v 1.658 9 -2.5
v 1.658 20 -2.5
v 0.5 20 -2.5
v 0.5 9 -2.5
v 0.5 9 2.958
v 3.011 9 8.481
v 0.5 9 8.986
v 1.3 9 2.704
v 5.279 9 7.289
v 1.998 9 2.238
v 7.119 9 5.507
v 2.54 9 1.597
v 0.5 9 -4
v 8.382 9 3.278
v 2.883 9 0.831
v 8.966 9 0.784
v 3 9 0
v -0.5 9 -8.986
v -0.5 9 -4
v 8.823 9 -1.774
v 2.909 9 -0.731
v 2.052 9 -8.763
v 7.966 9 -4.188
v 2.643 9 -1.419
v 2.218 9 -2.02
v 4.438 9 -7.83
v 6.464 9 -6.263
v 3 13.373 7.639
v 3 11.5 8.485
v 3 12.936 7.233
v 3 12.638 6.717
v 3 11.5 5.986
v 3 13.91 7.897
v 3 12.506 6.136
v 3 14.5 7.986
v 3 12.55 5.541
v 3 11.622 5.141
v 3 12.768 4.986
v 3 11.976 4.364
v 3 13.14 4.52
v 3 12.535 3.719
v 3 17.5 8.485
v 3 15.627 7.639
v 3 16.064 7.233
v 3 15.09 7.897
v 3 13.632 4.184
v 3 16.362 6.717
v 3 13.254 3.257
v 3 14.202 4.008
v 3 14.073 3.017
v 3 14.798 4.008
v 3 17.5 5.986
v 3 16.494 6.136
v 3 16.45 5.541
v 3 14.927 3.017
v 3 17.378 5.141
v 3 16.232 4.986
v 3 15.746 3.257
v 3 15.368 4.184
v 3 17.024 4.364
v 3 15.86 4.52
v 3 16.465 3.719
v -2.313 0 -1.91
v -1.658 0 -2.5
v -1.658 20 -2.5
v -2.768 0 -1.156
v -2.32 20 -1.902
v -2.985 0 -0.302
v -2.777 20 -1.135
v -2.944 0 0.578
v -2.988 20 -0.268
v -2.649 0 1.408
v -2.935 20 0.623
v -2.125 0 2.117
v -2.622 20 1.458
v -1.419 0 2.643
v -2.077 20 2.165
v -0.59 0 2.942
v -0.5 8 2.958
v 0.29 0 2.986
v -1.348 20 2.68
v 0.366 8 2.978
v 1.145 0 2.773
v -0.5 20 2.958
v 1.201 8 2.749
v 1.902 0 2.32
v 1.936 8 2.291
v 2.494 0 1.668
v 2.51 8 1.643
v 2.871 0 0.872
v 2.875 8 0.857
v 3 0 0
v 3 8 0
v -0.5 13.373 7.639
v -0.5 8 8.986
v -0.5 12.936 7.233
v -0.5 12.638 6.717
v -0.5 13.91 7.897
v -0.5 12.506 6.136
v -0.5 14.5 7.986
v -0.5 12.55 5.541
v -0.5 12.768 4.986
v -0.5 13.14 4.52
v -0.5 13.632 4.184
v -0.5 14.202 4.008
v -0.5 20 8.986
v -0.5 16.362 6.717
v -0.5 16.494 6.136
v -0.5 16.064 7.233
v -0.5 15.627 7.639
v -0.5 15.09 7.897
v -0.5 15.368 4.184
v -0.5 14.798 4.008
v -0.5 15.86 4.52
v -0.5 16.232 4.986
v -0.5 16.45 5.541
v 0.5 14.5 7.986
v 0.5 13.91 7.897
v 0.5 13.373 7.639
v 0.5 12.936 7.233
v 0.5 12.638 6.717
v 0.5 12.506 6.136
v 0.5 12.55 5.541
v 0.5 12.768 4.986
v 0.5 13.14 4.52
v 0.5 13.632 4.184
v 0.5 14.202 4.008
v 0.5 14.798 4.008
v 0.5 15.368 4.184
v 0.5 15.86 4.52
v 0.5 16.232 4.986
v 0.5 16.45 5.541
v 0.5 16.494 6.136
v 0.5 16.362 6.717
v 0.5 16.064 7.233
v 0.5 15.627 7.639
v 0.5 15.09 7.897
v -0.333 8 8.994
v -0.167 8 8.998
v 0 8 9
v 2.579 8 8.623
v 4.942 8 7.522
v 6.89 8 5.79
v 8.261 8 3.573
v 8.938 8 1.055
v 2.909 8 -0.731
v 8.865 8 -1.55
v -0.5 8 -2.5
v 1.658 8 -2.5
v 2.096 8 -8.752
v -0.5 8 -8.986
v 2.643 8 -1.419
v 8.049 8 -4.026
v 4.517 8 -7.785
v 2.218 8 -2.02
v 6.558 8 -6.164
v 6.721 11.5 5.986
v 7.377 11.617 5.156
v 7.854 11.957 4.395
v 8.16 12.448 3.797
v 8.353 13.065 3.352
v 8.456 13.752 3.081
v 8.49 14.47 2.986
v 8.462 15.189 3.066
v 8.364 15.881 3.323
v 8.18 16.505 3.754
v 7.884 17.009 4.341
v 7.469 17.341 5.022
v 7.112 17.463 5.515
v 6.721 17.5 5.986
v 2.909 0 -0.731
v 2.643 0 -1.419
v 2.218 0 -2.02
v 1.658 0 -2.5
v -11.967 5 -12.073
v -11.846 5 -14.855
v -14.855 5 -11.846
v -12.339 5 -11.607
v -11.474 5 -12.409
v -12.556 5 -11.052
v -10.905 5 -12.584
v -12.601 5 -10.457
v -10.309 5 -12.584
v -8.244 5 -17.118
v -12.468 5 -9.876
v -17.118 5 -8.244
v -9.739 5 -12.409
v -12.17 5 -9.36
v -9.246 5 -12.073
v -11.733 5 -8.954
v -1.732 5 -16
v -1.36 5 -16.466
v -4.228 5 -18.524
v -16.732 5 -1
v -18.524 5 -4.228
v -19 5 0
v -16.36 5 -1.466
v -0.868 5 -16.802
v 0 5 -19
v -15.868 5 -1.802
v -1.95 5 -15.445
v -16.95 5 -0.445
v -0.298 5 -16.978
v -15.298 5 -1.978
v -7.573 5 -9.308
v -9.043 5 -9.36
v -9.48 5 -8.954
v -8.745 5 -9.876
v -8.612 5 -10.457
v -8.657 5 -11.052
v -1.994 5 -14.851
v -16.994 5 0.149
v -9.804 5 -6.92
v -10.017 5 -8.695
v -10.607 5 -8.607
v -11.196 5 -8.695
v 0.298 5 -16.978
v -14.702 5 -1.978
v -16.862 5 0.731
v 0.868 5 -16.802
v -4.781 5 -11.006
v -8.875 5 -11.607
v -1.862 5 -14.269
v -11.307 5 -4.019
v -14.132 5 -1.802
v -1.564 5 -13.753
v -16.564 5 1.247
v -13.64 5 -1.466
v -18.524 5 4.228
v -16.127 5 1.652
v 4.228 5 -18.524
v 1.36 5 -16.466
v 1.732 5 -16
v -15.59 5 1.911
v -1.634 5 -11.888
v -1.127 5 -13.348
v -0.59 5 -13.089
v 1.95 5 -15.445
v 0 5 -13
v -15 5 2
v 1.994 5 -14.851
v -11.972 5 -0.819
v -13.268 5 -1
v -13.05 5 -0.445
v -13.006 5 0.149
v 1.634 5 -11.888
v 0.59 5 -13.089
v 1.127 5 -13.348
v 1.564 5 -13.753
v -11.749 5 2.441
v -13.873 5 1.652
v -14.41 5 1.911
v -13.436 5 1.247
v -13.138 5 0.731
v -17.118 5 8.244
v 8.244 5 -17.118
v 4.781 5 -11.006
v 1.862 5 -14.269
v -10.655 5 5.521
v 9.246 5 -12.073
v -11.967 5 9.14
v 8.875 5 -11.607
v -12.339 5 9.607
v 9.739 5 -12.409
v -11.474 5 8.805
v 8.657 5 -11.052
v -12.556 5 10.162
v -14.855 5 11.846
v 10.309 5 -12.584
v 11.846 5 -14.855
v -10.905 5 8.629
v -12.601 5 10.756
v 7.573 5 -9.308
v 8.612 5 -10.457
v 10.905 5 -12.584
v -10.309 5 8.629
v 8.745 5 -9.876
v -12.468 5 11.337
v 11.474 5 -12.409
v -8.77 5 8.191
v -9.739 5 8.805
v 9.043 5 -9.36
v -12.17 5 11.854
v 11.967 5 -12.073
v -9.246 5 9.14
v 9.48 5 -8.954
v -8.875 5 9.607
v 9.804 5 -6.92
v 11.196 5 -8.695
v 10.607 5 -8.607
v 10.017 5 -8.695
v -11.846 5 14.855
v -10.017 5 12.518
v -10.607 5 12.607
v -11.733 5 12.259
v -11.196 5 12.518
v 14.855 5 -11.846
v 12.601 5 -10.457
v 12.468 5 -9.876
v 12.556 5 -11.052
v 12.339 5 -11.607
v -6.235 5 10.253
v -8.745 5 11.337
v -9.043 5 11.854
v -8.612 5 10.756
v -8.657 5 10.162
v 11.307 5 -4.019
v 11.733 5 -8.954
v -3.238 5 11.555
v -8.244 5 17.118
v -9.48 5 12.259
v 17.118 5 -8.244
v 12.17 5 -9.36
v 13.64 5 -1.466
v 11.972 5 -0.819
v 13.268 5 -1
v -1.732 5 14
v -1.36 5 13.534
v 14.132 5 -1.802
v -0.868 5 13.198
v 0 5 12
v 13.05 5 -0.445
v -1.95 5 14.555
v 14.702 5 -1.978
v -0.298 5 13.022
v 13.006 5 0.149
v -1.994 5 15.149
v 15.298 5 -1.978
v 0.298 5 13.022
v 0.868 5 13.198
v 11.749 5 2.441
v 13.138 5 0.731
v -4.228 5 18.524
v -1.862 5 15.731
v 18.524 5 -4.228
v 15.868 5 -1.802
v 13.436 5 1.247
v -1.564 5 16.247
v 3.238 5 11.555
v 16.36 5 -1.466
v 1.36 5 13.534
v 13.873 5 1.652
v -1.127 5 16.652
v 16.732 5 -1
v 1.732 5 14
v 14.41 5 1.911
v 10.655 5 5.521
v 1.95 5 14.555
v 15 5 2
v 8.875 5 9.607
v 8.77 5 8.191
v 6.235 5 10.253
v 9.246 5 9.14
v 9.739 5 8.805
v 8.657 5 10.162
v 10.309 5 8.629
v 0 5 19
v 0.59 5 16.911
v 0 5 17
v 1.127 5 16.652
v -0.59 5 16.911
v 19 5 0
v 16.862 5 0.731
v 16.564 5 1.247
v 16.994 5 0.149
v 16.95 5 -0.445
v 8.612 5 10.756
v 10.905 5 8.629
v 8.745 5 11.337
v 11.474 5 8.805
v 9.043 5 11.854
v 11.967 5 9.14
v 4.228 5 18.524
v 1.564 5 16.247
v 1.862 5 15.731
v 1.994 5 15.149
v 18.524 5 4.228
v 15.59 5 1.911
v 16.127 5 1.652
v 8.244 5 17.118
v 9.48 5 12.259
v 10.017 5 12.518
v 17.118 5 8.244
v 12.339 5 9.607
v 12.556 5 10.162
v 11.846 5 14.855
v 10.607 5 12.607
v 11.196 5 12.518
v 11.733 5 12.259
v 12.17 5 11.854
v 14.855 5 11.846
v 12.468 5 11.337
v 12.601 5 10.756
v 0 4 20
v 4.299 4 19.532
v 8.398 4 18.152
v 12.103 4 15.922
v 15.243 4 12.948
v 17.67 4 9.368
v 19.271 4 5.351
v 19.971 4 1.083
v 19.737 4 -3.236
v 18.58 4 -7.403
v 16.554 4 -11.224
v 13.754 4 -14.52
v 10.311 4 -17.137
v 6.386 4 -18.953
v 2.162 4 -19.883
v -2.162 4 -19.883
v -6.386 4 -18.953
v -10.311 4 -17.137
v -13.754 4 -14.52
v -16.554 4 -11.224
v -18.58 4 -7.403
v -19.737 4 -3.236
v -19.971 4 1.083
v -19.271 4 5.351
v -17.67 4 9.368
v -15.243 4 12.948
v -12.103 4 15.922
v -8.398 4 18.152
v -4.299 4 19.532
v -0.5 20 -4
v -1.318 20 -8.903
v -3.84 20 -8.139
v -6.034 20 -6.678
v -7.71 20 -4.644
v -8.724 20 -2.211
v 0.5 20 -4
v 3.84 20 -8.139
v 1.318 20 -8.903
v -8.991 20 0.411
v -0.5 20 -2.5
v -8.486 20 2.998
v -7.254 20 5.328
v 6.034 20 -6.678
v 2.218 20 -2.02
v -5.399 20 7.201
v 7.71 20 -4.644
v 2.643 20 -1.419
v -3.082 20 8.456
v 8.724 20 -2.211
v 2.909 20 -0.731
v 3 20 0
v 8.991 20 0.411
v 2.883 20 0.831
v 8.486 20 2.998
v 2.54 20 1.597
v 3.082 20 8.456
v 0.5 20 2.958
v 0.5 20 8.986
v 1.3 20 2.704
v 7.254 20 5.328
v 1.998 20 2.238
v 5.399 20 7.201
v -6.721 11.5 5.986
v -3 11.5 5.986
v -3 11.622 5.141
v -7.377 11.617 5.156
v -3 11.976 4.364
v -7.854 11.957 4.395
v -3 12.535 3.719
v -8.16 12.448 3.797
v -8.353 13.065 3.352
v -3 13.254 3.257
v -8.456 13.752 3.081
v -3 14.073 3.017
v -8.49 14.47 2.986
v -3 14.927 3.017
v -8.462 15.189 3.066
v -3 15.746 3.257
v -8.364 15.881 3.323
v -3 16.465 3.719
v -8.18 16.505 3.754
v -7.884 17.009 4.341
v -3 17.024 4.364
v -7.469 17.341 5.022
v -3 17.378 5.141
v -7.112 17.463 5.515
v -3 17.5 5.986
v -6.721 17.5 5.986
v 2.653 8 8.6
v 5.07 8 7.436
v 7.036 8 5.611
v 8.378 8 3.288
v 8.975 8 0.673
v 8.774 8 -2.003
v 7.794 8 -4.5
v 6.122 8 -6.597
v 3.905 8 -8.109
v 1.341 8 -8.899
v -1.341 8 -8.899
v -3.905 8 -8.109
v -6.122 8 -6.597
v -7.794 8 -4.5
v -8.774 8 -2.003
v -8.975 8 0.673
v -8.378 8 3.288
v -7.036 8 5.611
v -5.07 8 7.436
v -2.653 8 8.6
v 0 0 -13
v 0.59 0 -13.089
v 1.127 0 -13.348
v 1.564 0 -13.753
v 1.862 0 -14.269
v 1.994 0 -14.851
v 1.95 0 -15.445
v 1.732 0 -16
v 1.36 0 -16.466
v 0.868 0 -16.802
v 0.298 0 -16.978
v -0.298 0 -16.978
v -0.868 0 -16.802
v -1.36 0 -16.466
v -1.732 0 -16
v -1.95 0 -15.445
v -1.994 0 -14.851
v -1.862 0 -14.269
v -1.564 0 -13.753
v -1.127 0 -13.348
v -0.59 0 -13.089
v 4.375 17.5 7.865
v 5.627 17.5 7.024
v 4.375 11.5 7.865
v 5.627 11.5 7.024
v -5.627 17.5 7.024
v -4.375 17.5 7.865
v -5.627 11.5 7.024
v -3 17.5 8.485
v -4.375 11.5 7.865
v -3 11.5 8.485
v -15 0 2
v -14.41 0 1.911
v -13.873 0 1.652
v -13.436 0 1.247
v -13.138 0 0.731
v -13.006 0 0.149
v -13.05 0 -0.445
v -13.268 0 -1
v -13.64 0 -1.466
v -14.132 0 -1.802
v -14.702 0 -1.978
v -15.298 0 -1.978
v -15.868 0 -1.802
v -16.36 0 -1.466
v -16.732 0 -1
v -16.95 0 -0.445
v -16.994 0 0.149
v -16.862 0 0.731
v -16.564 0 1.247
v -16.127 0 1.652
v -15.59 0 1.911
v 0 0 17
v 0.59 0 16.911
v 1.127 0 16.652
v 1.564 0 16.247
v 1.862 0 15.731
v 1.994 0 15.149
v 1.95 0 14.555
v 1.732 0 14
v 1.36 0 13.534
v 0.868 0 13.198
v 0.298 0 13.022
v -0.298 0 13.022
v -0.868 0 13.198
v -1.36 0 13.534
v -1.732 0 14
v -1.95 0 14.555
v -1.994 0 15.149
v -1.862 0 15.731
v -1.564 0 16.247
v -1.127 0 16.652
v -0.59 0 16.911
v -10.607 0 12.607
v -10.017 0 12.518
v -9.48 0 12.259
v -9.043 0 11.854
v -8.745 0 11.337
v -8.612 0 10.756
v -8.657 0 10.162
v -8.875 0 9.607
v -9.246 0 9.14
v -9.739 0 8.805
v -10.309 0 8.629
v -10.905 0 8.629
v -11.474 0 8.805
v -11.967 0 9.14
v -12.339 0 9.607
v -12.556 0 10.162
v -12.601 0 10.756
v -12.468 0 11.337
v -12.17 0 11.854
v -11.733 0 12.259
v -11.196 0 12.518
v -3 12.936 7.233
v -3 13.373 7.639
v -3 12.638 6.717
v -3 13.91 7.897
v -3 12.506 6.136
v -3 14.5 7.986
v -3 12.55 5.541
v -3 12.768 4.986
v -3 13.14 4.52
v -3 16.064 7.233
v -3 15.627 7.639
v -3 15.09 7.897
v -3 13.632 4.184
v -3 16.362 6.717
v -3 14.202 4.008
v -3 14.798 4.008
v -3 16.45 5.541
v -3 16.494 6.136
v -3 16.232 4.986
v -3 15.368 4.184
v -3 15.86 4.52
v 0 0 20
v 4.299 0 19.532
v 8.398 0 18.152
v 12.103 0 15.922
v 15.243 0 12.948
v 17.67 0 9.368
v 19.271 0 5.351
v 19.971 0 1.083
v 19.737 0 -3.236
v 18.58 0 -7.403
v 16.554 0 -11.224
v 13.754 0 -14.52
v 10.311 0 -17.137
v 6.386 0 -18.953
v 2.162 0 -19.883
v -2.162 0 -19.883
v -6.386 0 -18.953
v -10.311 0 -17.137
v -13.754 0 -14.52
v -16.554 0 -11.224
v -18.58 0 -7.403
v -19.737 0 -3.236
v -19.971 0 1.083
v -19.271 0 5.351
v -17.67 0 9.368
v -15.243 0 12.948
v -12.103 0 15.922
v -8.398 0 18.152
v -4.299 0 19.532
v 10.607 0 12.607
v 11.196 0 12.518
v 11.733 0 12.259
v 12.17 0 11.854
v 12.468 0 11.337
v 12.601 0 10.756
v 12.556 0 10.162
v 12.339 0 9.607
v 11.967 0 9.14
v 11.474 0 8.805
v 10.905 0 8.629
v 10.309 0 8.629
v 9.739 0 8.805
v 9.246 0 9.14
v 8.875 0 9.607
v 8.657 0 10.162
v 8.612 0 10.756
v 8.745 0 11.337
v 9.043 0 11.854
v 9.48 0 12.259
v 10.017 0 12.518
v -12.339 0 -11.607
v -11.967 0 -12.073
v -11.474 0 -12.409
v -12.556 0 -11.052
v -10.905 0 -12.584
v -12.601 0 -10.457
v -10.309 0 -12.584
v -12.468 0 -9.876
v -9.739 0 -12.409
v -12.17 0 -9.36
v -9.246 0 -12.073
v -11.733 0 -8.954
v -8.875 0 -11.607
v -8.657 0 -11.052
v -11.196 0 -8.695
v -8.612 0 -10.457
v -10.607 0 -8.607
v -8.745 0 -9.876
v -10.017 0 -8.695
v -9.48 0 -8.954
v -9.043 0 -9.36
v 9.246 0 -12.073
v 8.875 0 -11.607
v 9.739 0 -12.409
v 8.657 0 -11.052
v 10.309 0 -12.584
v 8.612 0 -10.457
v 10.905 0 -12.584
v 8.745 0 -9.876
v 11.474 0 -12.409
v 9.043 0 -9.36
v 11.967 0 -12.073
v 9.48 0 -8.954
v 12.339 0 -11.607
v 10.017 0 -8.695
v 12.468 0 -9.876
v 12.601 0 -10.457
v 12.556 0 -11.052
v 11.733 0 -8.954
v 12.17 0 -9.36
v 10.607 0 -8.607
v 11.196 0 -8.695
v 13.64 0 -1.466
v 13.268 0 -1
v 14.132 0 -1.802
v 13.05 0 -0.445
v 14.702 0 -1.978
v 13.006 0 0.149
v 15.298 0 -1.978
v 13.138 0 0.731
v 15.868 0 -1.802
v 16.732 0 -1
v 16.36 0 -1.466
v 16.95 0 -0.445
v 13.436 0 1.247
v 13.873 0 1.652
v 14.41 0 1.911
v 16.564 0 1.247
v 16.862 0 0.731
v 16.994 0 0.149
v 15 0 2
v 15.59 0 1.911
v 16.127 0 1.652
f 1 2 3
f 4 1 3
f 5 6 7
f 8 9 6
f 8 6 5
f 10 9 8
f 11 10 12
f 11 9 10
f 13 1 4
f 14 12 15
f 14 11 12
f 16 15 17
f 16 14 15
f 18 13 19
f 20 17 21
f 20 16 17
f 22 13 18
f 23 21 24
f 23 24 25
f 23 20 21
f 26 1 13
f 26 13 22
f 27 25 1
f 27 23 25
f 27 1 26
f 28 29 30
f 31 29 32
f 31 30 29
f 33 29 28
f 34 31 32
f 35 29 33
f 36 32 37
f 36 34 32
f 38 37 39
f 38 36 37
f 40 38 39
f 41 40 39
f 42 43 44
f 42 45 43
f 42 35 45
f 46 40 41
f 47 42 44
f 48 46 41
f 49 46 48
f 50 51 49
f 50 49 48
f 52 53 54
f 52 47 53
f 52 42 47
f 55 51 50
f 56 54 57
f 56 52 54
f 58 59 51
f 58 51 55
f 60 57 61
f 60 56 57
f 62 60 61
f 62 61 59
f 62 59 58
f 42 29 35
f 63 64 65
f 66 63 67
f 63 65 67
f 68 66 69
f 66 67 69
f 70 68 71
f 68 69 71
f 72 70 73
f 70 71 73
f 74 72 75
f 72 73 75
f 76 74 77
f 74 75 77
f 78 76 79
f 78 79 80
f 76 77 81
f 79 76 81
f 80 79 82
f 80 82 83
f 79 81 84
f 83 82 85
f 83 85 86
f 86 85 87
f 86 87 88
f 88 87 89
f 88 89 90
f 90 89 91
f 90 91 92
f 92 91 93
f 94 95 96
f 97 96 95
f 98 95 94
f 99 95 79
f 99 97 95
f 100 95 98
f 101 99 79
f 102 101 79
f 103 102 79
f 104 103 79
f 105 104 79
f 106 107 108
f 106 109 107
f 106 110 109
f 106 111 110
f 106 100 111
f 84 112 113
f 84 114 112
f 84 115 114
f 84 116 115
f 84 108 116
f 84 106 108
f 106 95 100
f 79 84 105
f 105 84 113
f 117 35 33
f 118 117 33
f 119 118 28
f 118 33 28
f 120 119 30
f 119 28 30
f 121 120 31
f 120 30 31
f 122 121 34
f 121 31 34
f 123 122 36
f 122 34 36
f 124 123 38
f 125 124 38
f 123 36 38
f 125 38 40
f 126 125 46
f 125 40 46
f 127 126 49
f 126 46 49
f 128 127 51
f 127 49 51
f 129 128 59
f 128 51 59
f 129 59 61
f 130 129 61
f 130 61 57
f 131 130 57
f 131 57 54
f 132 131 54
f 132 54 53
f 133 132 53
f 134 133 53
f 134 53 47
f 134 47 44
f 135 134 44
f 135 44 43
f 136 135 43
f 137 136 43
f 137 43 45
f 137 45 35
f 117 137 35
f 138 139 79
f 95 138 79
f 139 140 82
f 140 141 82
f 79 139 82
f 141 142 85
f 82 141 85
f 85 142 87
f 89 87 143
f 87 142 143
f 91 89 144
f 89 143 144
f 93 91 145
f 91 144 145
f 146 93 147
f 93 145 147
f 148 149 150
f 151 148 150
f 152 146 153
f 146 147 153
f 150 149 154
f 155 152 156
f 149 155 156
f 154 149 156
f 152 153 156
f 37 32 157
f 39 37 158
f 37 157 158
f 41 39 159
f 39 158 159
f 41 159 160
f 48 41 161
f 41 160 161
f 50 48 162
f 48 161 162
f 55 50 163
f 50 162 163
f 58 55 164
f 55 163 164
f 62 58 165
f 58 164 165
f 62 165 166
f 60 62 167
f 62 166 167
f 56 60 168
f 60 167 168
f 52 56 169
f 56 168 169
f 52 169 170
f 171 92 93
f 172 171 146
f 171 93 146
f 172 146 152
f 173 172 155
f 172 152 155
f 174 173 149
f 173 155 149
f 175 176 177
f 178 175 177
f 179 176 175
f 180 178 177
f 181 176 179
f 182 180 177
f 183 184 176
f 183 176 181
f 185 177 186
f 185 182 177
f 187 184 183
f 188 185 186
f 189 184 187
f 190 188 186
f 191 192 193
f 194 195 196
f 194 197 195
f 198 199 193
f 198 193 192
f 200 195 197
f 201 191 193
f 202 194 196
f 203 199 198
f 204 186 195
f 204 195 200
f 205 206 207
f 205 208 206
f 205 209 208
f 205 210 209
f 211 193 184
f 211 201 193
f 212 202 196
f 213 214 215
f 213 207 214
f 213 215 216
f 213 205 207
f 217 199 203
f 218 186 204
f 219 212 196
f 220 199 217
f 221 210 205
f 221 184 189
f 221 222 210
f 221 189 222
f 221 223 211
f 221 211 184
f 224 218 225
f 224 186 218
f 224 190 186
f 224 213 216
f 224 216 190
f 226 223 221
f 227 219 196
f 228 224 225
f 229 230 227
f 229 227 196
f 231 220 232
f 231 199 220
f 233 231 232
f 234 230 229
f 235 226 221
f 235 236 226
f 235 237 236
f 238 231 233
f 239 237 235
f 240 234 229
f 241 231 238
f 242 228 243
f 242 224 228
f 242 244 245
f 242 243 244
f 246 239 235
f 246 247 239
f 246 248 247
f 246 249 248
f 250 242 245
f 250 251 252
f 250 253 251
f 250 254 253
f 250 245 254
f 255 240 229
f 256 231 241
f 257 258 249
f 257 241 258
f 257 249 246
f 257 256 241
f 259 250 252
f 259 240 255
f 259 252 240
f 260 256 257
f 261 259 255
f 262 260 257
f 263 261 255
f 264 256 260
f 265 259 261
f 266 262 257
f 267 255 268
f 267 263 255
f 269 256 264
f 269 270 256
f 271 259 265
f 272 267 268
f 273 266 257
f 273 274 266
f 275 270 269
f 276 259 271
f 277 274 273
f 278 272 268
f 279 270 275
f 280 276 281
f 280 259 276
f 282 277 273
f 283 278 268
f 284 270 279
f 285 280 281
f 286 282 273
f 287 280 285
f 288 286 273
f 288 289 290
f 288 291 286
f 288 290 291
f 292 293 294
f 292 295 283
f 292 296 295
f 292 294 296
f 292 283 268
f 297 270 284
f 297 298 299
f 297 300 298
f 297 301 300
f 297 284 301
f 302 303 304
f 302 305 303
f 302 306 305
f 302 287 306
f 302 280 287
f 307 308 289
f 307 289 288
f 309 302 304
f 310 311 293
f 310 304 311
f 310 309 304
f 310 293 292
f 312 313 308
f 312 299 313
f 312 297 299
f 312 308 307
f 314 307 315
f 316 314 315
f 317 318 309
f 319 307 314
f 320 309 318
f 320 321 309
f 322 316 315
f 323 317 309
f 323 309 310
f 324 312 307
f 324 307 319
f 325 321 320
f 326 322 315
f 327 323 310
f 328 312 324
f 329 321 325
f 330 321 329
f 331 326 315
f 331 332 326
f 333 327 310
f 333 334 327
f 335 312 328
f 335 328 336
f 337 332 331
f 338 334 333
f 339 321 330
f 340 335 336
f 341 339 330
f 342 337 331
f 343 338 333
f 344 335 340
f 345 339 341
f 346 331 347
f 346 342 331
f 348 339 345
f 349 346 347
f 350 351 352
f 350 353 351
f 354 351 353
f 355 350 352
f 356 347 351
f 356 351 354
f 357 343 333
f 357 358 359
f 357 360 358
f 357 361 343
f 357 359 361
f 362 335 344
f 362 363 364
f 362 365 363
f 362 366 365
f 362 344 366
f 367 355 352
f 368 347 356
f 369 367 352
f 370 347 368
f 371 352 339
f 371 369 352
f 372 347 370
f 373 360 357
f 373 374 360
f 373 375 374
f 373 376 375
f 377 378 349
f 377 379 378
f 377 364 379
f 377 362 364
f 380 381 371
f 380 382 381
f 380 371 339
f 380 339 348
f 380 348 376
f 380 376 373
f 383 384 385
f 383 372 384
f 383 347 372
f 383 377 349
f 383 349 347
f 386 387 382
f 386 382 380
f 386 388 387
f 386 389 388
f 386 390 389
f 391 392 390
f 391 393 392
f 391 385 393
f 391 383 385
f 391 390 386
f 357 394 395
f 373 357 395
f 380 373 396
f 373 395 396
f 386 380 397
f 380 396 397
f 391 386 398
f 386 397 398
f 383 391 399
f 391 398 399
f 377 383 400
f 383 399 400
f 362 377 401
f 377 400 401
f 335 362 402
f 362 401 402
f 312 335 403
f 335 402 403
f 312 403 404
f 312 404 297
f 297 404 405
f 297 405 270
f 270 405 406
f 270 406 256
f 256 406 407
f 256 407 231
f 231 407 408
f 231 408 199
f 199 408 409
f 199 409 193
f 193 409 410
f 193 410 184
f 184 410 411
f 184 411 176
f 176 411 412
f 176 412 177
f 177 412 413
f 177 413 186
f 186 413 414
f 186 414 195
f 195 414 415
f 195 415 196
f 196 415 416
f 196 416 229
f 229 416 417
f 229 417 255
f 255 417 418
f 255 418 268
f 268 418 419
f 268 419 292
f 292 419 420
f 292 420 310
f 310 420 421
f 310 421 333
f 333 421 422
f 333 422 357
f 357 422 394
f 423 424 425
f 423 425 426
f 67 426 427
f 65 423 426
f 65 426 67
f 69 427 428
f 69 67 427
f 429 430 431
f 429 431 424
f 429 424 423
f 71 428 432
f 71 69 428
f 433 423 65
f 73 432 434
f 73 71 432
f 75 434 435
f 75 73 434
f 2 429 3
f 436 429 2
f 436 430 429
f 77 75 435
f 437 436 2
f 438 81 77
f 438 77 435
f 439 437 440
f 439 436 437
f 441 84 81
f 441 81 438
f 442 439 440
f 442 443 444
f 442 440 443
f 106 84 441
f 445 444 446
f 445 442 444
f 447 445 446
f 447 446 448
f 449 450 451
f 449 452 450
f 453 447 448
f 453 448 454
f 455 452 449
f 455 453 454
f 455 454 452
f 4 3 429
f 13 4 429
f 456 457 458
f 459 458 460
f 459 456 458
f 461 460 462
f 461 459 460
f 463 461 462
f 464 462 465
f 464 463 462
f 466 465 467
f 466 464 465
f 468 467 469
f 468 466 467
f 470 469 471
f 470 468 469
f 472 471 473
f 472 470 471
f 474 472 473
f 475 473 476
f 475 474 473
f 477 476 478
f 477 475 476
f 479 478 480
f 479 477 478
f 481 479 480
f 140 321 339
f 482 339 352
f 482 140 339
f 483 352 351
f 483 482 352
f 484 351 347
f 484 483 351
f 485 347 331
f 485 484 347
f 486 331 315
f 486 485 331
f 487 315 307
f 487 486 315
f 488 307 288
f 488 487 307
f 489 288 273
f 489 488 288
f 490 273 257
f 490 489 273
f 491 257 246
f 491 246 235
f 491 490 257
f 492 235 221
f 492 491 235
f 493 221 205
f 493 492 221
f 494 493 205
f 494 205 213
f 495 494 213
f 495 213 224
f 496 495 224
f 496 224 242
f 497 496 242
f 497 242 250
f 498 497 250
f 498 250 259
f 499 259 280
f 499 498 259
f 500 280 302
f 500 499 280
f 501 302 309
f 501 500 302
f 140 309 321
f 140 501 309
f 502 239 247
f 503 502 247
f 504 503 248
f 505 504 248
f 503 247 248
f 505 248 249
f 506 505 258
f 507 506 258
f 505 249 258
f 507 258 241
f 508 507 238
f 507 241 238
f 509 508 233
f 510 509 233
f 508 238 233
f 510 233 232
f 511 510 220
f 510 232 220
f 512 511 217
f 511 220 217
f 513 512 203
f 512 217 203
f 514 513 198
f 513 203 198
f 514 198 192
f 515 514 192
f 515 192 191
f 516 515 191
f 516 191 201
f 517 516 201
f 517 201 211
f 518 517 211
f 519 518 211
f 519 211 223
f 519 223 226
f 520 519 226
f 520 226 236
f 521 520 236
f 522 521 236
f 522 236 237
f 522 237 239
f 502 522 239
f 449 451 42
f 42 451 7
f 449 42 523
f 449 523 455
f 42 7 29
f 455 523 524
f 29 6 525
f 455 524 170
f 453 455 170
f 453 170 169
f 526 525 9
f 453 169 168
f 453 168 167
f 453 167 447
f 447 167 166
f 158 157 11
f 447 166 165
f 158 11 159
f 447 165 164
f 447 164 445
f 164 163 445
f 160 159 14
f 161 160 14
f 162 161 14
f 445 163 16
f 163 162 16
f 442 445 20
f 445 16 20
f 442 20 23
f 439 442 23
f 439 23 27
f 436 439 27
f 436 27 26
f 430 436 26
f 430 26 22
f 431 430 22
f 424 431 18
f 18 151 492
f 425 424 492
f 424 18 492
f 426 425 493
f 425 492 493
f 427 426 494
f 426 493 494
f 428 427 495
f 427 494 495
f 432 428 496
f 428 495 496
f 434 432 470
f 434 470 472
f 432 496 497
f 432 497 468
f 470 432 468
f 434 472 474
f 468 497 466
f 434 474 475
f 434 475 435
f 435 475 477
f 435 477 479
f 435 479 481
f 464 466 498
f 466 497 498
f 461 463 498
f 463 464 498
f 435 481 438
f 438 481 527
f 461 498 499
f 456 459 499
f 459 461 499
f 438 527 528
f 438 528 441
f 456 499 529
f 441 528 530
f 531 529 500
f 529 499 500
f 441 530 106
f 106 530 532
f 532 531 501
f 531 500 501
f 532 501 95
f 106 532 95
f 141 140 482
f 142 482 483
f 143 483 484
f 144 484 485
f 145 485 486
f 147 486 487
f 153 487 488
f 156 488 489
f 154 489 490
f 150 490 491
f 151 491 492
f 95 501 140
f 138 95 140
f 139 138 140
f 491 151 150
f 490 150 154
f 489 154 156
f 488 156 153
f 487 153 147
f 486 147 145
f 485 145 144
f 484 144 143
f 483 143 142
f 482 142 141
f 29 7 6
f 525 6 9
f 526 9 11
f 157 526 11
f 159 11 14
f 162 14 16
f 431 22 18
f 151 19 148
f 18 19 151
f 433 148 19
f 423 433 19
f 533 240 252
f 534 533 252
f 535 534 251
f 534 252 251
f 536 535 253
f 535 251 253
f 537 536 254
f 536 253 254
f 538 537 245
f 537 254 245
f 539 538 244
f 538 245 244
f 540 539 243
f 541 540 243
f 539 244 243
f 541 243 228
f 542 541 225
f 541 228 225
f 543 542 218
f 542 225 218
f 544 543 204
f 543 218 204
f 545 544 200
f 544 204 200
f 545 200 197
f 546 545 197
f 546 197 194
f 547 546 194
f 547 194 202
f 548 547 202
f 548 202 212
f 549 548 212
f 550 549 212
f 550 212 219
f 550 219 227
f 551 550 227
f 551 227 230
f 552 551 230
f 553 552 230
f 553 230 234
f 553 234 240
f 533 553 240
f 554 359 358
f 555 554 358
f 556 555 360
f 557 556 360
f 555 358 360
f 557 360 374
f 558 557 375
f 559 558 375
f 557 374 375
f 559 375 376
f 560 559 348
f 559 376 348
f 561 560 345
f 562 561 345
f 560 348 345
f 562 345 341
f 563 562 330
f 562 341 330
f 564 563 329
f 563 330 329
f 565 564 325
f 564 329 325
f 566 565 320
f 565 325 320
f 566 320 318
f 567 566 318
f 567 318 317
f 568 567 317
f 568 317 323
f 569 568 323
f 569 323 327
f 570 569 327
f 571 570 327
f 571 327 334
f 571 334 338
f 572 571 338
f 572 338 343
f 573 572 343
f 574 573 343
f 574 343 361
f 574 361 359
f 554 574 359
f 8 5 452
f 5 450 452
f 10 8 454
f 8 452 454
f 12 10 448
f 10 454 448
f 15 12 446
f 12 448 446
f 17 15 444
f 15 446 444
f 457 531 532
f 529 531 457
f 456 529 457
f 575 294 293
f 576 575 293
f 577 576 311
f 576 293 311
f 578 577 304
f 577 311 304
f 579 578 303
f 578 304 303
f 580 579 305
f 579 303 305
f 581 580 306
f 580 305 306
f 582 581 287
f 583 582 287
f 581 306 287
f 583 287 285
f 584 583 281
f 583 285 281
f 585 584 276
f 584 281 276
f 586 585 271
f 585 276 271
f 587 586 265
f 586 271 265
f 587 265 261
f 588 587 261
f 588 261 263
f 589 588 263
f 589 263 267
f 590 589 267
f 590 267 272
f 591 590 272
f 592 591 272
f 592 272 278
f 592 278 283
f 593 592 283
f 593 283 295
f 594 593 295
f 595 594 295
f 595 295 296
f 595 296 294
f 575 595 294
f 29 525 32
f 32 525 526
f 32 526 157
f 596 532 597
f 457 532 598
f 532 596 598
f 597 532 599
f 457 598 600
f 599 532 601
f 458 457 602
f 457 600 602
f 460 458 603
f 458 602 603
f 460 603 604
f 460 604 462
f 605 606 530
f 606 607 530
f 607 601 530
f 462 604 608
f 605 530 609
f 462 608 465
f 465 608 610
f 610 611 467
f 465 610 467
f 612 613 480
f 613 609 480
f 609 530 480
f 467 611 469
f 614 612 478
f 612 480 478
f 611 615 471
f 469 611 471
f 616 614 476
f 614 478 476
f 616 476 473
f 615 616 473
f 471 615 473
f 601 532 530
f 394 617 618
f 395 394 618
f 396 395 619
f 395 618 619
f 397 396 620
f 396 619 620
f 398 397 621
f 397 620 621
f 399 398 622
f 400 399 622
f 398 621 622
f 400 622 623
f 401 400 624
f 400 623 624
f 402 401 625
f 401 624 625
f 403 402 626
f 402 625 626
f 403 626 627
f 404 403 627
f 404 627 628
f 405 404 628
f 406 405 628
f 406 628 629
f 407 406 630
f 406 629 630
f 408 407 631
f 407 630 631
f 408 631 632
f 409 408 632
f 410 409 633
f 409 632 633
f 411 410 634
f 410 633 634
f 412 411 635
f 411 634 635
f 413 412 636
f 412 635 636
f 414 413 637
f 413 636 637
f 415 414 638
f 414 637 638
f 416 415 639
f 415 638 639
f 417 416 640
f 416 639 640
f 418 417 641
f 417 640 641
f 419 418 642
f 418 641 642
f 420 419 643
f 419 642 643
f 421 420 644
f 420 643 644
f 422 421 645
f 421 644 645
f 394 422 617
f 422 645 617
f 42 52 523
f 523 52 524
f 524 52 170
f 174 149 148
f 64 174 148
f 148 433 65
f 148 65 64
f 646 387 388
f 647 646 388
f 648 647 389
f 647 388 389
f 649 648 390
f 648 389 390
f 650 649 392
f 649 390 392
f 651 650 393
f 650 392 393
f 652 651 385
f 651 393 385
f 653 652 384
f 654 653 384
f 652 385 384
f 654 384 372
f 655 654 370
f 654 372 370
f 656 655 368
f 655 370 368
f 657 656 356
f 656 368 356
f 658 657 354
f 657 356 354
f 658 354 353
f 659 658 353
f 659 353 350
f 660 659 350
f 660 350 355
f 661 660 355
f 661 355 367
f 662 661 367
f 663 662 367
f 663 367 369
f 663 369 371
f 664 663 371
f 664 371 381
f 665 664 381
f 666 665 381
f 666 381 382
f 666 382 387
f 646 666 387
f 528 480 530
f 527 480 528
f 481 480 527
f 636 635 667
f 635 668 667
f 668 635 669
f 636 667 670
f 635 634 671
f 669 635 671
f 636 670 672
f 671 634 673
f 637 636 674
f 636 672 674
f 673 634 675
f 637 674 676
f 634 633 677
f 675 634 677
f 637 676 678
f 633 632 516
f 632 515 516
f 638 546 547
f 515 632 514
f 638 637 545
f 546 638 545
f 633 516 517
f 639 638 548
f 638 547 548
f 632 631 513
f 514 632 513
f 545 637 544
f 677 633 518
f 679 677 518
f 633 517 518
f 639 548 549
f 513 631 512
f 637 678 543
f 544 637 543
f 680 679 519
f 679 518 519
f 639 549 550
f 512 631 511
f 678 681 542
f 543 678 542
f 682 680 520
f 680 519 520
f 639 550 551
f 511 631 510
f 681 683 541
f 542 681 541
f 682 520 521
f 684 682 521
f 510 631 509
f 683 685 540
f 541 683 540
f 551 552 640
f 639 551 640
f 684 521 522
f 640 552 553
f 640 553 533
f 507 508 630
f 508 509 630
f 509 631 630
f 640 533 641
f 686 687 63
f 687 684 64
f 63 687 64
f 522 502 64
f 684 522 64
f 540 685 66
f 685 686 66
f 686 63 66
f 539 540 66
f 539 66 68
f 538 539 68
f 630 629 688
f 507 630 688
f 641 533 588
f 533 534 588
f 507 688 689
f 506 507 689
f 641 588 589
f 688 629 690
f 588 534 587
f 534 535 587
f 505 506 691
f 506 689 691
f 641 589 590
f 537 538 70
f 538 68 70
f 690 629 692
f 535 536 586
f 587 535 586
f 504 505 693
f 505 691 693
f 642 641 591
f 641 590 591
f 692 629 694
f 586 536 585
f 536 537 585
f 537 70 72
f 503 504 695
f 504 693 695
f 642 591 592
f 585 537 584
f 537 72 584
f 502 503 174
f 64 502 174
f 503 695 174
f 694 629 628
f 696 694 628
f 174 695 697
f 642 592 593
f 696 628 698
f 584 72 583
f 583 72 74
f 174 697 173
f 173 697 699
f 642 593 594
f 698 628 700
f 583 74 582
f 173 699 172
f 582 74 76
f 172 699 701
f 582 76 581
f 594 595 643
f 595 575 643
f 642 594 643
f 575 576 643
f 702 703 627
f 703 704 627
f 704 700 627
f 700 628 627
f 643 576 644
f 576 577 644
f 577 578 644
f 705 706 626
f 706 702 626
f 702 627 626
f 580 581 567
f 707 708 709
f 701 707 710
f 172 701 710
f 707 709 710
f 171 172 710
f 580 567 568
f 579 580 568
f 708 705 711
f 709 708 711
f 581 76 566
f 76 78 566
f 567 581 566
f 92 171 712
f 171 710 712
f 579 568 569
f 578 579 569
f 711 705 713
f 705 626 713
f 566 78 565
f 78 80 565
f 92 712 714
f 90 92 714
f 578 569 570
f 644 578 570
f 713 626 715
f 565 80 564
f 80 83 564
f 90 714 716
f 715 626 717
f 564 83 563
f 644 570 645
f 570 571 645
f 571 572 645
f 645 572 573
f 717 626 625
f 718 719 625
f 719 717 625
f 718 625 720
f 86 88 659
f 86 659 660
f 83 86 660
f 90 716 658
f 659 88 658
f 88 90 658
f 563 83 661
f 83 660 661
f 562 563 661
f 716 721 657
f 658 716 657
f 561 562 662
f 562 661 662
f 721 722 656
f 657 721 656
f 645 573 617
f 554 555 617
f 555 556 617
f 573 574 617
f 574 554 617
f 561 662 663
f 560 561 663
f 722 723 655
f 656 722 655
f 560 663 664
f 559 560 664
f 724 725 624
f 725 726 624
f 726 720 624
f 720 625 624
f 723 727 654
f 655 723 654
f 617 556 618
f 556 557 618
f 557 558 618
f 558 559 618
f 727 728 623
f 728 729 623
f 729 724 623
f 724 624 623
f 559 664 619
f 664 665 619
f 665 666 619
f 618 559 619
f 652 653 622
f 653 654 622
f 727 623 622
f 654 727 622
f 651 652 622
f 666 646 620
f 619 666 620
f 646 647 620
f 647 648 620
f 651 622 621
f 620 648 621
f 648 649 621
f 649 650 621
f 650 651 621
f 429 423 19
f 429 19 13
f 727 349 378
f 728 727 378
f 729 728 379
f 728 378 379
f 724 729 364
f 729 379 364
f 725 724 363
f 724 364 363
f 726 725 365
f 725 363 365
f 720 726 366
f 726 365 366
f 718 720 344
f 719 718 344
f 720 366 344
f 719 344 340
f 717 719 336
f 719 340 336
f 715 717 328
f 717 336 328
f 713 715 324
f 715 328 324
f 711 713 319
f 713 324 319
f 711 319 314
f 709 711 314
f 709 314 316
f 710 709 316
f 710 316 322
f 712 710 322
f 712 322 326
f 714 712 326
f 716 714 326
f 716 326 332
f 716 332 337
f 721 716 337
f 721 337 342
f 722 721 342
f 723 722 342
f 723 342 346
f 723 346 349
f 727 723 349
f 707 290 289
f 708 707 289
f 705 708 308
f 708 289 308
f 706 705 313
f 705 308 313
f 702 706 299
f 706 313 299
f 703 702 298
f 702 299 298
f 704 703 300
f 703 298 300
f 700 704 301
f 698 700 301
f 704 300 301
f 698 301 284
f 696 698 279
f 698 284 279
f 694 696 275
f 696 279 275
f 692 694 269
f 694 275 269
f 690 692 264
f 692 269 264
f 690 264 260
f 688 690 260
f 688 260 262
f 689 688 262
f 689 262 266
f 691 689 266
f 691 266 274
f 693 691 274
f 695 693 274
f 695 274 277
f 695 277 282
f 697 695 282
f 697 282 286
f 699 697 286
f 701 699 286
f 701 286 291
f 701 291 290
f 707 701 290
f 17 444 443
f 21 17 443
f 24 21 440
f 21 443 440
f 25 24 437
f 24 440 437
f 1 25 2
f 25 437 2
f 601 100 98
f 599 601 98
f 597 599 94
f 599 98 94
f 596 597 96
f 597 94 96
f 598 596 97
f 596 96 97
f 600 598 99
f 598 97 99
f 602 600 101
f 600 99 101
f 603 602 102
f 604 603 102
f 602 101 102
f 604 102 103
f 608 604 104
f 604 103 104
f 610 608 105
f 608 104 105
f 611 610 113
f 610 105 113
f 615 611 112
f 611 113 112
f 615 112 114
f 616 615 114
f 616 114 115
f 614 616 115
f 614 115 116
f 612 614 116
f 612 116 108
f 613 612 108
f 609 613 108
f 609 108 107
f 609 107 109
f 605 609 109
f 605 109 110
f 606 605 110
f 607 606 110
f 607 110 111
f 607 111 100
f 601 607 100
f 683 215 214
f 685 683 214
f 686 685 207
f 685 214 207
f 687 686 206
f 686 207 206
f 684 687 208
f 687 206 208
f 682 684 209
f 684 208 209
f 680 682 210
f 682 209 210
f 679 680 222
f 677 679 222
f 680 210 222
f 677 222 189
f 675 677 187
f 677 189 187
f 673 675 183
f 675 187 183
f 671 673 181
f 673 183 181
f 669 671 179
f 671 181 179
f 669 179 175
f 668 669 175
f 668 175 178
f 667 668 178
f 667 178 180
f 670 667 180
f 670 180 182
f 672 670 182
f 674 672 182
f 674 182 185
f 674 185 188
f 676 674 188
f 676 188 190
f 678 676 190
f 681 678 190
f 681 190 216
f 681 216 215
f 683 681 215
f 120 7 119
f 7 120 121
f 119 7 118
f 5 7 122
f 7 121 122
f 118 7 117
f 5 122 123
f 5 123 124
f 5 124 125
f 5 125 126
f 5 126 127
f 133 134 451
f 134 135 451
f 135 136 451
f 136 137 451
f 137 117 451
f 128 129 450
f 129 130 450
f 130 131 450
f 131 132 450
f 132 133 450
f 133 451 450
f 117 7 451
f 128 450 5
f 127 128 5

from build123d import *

# Parameters (mm, degrees)
SKETCH1_R           = 20
BOSS_EXTRUDE1_DEPTH = 5
SKETCH2_R           = 2
CUT_EXTRUDE1_DEPTH  = 29.722813233
SKETCH3_R           = 9
BOSS_EXTRUDE2_DEPTH = 15
CUT_EXTRUDE2_DEPTH  = 35.641016151
SKETCH5_W           = 1
SKETCH5_H           = 13
CUT_EXTRUDE3_DEPTH  = 12
CUT_EXTRUDE4_REACH  = 42.509
SKETCH7_W           = 17.986100378
SKETCH7_H           = 1
SKETCH8_R           = 3
CUT_EXTRUDE5_DEPTH  = 6
SKETCH9_R           = 2
CUT_EXTRUDE6_DEPTH  = 37.455452322
CHAMFER3_SIZE       = 3
CHAMFER4_SIZE       = 1


with BuildPart() as part:
    # Sketch1 → Boss-Extrude1 (new body)
    with BuildSketch(Plane(origin=(0, 0, 0), x_dir=(1, 0, 0), z_dir=(0, 1, 0))):
        with Locations(Location((0, 0, 0), (0, 0, 270))):
            Circle(SKETCH1_R)
    extrude(amount=BOSS_EXTRUDE1_DEPTH)

    # Sketch2 → Cut-Extrude1 (cut, through all)
    with BuildSketch(Plane(origin=(0, 5, 0), x_dir=(1, 0, 0), z_dir=(0, 1, 0))):
        with Locations(Location((0, 15, 0), (0, 0, 270))):
            Circle(SKETCH2_R)
        with Locations(Location((10.606601718, 10.606601718, 0), (0, 0, 270))):
            Circle(SKETCH2_R)
        with Locations(Location((15, 0, 0), (0, 0, 270))):
            Circle(SKETCH2_R)
        with Locations(Location((10.606601718, -10.606601718, 0), (0, 0, 270))):
            Circle(SKETCH2_R)
        with Locations(Location((0, -15, 0), (0, 0, 270))):
            Circle(SKETCH2_R)
        with Locations(Location((-10.606601718, -10.606601718, 0), (0, 0, 270))):
            Circle(SKETCH2_R)
        with Locations(Location((-15, 0, 0), (0, 0, 270))):
            Circle(SKETCH2_R)
        with Locations(Location((-10.606601718, 10.606601718, 0), (0, 0, 270))):
            Circle(SKETCH2_R)
    extrude(amount=-CUT_EXTRUDE1_DEPTH, mode=Mode.SUBTRACT)

    # Sketch3 → Boss-Extrude2 (add)
    with BuildSketch(Plane(origin=(0, 5, 0), x_dir=(1, 0, 0), z_dir=(0, 1, 0))):
        with Locations(Location((0, 0, 0), (0, 0, 270))):
            Circle(SKETCH3_R)
    extrude(amount=BOSS_EXTRUDE2_DEPTH)

    # Sketch4 → Cut-Extrude2 (cut, through all)
    with BuildSketch(Plane(origin=(0, 20, 0), x_dir=(1, 0, 0), z_dir=(0, 1, 0))):
        with BuildLine():
            Line((1.658312395, 2.5), (-1.658312395, 2.5))
            ThreePointArc((-1.658312395, 2.5), (-1.418637165, -2.643382037), (3, 0))
            ThreePointArc((3, 0), (2.643382037, 1.418637165), (1.658312395, 2.5))
        make_face()
    extrude(amount=-CUT_EXTRUDE2_DEPTH, mode=Mode.SUBTRACT)

    # Sketch5 → Cut-Extrude3 (cut)
    with BuildSketch(Plane(origin=(0, 20, 0), x_dir=(1, 0, 0), z_dir=(0, 1, 0))):
        with Locations((0, -2.5)):
            Rectangle(SKETCH5_W, SKETCH5_H)
    extrude(amount=-CUT_EXTRUDE3_DEPTH, mode=Mode.SUBTRACT)

    # Cut-Extrude4: up to this face of the body (flat: up to its plane)
    cut_extrude4_end = Plane(part.part.faces().sort_by_distance((-0.5, 14, 5.972070135))[0])
    # Sketch7 → Cut-Extrude4 (cut, up to the picked face)
    with BuildSketch(Plane(origin=(9, 0, 0), x_dir=(0, 0, -1), z_dir=(1, 0, 0)), mode=Mode.PRIVATE) as cut_extrude4_sk1:
        with Locations((0.006949811, 8.5)):
            Rectangle(SKETCH7_W, SKETCH7_H)
    cut_extrude4_tool1 = split(extrude(cut_extrude4_sk1.sketch, amount=-CUT_EXTRUDE4_REACH, mode=Mode.PRIVATE), bisect_by=cut_extrude4_end, keep=Keep.BOTH, mode=Mode.PRIVATE)
    add(cut_extrude4_tool1.solids().sort_by(Axis((9, 8.5, -0.00695), (-1, 0, 0)))[0], mode=Mode.SUBTRACT)

    # Sketch8 → Cut-Extrude5 (cut)
    with BuildSketch(Plane(origin=(9, 0, 0), x_dir=(0, 0, -1), z_dir=(1, 0, 0))):
        with Locations((-5.986100378, 14.5)):
            Circle(SKETCH8_R)
        with BuildLine():
            ThreePointArc((-8.986100378, 14.5), (-8.107420721, 16.621320344), (-5.986100378, 17.5))
            Line((-5.986100378, 17.5), (-8.986100378, 17.5))
            Line((-8.986100378, 17.5), (-8.986100378, 14.5))
        make_face()
        with BuildLine():
            ThreePointArc((-5.986100378, 11.5), (-8.107420721, 12.378679656), (-8.986100378, 14.5))
            Line((-8.986100378, 14.5), (-8.986100378, 11.5))
            Line((-8.986100378, 11.5), (-5.986100378, 11.5))
        make_face()
    cut_extrude5 = extrude(amount=-CUT_EXTRUDE5_DEPTH, mode=Mode.SUBTRACT)

    # Mirror1: Cut-Extrude5 across plane
    add(cut_extrude5.mirror(Plane(origin=(0, 0, 0), x_dir=(0, 0, 1), z_dir=(1, 0, 0))), mode=Mode.SUBTRACT)

    # Sketch9 → Cut-Extrude6 (cut, through all)
    with BuildSketch(Plane(origin=(3, 0, 0), x_dir=(0, 0, -1), z_dir=(1, 0, 0))):
        with Locations(Location((-5.986100378, 14.5, 0), (0, 0, 180))):
            Circle(SKETCH9_R)
    extrude(amount=-CUT_EXTRUDE6_DEPTH, mode=Mode.SUBTRACT)

    # Chamfer3
    chamfer3_edges = [part.edges().sort_by_distance(p)[0] for p in [
        (0, 5, -9),
    ]]
    chamfer(chamfer3_edges, length=CHAMFER3_SIZE - 0.0001)  # a hair under: the kernel refuses the full size

    # Chamfer4
    chamfer4_edges = [part.edges().sort_by_distance(p)[0] for p in [
        (0, 5, -20),
    ]]
    chamfer(chamfer4_edges, length=CHAMFER4_SIZE)


solid = part.part
